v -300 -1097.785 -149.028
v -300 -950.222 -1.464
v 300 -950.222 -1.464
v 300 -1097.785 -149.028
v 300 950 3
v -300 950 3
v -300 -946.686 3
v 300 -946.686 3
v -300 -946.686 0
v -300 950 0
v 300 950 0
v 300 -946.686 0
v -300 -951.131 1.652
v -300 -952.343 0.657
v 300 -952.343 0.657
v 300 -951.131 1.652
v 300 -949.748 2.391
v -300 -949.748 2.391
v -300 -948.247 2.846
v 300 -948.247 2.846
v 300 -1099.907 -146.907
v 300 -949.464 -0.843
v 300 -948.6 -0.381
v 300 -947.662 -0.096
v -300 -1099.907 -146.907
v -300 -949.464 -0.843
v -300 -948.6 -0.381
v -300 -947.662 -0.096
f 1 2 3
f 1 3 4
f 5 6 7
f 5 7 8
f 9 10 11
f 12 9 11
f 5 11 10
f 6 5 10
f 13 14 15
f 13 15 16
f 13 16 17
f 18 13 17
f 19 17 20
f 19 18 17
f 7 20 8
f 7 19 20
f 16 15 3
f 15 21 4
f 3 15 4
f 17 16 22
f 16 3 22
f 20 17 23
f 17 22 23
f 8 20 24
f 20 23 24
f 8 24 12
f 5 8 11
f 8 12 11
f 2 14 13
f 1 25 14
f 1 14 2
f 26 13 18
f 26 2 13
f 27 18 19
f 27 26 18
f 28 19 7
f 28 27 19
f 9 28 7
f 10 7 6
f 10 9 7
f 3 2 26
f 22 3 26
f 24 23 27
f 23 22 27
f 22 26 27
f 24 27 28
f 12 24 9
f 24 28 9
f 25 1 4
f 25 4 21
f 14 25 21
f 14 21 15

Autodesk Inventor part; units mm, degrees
ref_plane "YZ Plane" through (0, 0, 0) normal (1, 0, 0) x (0, 1, 0)
ref_plane "XZ Plane" through (0, 0, 0) normal (0, 1, 0) x (-1, 0, 0)
ref_plane "XY Plane" through (0, 0, 0) normal (0, 0, 1) x (1, 0, 0)
sketch "Sketch1" plane through (0, 0, 0) normal (0, 0, 1) x (1, 0, 0)
  line L0 (-300, -950) -> (300, -950)
  line L1 (300, -950) -> (300, 950)
  line L2 (300, 950) -> (-300, 950)
  line L3 (-300, 950) -> (-300, -950)
  line L4 (-300, -950) -> (300, 950) construction
  line L5 (300, -950) -> (-300, 950) construction
  point P0 (0, 0)
  dimension "d0" = 600
  dimension "d1" = 1900
extrude "Plate1" add sketch "Sketch1" along normal blind 3
sketch "Sketch3" plane through (-300, -947.8787, 0.8787) normal (0, -0.7071068, 0.7071068) x (1, 0, 0)
  line L0 (600, 0) -> (0, 0)
  line L1 (0, 0) -> (0, -212)
  line L2 (0, -212) -> (600, -212)
  line L3 (600, -212) -> (600, 0)
edge flange "Flange2" height 212 angle 45 thickness 3 bend radius 5 thickness toward (0, -0.7071068, 0.7071068) relief round relief width 3 relief depth 1.5 edges at (0, -950, 0) wall of the first edge with corners at (300, -947.8787, 0.8787) (-300, -947.8787, 0.8787) (-300, -1097.7853, -149.028) (300, -1097.7853, -149.028)
bend "Bend2"
corner "Corner2"
sketch "Sketch5" plane through (300, -1097.7853, -149.028) normal (0, 0.7071068, -0.7071068) x (-1, 0, 0)
  line L0 (575, 36.661) -> (575, 25) construction
  line L1 (575, 25) -> (375, 25) construction
  line L2 (375, 25) -> (375, 36.661) construction
  line L3 (375, 36.661) -> (575, 36.661) construction
  line L4 (0, 0) -> (600, 0) projected
  line L5 (600, 208.6863) -> (600, 0) projected
  point P0 (300, 881.6301)
  point P1 (575, 30.8305)
  dimension "d23" = 200
  dimension "d24" = 11.661
  dimension "d25" = 25
  dimension "d26" = 25
mark "Mark1"
equation "\"d2\" = Thickness"
equation "\"d13\" = BendReliefWidth"
equation "\"d14\" = BendReliefDepth"
equation "\"d15\" = MinimumRemnant"
equation "\"d16\" = TransitionRadius"
equation "\"d19\" = BendRadius"
equation "\"d20\" = CornerReliefSize"
equation "\"d21\" = GapSize"
equation "\"d22\" = JacobiRadiusSize"
equation "\"BendReliefWidth\" = Thickness"
equation "\"BendReliefDepth\" = 0.5 * Thickness"
equation "\"CornerReliefSize\" = 4 * Thickness"
equation "\"MinimumRemnant\" = 2 * Thickness"
equation "\"TransitionRadius\" = BendRadius"
equation "\"JacobiRadiusSize\" = BendRadius"
equation "\"GapSize\" = Thickness"
equation "\"Thickness\" = 3"
equation "\"BendRadius\" = 5"
properties part number "BSH 013 floor" material "09g2s"
